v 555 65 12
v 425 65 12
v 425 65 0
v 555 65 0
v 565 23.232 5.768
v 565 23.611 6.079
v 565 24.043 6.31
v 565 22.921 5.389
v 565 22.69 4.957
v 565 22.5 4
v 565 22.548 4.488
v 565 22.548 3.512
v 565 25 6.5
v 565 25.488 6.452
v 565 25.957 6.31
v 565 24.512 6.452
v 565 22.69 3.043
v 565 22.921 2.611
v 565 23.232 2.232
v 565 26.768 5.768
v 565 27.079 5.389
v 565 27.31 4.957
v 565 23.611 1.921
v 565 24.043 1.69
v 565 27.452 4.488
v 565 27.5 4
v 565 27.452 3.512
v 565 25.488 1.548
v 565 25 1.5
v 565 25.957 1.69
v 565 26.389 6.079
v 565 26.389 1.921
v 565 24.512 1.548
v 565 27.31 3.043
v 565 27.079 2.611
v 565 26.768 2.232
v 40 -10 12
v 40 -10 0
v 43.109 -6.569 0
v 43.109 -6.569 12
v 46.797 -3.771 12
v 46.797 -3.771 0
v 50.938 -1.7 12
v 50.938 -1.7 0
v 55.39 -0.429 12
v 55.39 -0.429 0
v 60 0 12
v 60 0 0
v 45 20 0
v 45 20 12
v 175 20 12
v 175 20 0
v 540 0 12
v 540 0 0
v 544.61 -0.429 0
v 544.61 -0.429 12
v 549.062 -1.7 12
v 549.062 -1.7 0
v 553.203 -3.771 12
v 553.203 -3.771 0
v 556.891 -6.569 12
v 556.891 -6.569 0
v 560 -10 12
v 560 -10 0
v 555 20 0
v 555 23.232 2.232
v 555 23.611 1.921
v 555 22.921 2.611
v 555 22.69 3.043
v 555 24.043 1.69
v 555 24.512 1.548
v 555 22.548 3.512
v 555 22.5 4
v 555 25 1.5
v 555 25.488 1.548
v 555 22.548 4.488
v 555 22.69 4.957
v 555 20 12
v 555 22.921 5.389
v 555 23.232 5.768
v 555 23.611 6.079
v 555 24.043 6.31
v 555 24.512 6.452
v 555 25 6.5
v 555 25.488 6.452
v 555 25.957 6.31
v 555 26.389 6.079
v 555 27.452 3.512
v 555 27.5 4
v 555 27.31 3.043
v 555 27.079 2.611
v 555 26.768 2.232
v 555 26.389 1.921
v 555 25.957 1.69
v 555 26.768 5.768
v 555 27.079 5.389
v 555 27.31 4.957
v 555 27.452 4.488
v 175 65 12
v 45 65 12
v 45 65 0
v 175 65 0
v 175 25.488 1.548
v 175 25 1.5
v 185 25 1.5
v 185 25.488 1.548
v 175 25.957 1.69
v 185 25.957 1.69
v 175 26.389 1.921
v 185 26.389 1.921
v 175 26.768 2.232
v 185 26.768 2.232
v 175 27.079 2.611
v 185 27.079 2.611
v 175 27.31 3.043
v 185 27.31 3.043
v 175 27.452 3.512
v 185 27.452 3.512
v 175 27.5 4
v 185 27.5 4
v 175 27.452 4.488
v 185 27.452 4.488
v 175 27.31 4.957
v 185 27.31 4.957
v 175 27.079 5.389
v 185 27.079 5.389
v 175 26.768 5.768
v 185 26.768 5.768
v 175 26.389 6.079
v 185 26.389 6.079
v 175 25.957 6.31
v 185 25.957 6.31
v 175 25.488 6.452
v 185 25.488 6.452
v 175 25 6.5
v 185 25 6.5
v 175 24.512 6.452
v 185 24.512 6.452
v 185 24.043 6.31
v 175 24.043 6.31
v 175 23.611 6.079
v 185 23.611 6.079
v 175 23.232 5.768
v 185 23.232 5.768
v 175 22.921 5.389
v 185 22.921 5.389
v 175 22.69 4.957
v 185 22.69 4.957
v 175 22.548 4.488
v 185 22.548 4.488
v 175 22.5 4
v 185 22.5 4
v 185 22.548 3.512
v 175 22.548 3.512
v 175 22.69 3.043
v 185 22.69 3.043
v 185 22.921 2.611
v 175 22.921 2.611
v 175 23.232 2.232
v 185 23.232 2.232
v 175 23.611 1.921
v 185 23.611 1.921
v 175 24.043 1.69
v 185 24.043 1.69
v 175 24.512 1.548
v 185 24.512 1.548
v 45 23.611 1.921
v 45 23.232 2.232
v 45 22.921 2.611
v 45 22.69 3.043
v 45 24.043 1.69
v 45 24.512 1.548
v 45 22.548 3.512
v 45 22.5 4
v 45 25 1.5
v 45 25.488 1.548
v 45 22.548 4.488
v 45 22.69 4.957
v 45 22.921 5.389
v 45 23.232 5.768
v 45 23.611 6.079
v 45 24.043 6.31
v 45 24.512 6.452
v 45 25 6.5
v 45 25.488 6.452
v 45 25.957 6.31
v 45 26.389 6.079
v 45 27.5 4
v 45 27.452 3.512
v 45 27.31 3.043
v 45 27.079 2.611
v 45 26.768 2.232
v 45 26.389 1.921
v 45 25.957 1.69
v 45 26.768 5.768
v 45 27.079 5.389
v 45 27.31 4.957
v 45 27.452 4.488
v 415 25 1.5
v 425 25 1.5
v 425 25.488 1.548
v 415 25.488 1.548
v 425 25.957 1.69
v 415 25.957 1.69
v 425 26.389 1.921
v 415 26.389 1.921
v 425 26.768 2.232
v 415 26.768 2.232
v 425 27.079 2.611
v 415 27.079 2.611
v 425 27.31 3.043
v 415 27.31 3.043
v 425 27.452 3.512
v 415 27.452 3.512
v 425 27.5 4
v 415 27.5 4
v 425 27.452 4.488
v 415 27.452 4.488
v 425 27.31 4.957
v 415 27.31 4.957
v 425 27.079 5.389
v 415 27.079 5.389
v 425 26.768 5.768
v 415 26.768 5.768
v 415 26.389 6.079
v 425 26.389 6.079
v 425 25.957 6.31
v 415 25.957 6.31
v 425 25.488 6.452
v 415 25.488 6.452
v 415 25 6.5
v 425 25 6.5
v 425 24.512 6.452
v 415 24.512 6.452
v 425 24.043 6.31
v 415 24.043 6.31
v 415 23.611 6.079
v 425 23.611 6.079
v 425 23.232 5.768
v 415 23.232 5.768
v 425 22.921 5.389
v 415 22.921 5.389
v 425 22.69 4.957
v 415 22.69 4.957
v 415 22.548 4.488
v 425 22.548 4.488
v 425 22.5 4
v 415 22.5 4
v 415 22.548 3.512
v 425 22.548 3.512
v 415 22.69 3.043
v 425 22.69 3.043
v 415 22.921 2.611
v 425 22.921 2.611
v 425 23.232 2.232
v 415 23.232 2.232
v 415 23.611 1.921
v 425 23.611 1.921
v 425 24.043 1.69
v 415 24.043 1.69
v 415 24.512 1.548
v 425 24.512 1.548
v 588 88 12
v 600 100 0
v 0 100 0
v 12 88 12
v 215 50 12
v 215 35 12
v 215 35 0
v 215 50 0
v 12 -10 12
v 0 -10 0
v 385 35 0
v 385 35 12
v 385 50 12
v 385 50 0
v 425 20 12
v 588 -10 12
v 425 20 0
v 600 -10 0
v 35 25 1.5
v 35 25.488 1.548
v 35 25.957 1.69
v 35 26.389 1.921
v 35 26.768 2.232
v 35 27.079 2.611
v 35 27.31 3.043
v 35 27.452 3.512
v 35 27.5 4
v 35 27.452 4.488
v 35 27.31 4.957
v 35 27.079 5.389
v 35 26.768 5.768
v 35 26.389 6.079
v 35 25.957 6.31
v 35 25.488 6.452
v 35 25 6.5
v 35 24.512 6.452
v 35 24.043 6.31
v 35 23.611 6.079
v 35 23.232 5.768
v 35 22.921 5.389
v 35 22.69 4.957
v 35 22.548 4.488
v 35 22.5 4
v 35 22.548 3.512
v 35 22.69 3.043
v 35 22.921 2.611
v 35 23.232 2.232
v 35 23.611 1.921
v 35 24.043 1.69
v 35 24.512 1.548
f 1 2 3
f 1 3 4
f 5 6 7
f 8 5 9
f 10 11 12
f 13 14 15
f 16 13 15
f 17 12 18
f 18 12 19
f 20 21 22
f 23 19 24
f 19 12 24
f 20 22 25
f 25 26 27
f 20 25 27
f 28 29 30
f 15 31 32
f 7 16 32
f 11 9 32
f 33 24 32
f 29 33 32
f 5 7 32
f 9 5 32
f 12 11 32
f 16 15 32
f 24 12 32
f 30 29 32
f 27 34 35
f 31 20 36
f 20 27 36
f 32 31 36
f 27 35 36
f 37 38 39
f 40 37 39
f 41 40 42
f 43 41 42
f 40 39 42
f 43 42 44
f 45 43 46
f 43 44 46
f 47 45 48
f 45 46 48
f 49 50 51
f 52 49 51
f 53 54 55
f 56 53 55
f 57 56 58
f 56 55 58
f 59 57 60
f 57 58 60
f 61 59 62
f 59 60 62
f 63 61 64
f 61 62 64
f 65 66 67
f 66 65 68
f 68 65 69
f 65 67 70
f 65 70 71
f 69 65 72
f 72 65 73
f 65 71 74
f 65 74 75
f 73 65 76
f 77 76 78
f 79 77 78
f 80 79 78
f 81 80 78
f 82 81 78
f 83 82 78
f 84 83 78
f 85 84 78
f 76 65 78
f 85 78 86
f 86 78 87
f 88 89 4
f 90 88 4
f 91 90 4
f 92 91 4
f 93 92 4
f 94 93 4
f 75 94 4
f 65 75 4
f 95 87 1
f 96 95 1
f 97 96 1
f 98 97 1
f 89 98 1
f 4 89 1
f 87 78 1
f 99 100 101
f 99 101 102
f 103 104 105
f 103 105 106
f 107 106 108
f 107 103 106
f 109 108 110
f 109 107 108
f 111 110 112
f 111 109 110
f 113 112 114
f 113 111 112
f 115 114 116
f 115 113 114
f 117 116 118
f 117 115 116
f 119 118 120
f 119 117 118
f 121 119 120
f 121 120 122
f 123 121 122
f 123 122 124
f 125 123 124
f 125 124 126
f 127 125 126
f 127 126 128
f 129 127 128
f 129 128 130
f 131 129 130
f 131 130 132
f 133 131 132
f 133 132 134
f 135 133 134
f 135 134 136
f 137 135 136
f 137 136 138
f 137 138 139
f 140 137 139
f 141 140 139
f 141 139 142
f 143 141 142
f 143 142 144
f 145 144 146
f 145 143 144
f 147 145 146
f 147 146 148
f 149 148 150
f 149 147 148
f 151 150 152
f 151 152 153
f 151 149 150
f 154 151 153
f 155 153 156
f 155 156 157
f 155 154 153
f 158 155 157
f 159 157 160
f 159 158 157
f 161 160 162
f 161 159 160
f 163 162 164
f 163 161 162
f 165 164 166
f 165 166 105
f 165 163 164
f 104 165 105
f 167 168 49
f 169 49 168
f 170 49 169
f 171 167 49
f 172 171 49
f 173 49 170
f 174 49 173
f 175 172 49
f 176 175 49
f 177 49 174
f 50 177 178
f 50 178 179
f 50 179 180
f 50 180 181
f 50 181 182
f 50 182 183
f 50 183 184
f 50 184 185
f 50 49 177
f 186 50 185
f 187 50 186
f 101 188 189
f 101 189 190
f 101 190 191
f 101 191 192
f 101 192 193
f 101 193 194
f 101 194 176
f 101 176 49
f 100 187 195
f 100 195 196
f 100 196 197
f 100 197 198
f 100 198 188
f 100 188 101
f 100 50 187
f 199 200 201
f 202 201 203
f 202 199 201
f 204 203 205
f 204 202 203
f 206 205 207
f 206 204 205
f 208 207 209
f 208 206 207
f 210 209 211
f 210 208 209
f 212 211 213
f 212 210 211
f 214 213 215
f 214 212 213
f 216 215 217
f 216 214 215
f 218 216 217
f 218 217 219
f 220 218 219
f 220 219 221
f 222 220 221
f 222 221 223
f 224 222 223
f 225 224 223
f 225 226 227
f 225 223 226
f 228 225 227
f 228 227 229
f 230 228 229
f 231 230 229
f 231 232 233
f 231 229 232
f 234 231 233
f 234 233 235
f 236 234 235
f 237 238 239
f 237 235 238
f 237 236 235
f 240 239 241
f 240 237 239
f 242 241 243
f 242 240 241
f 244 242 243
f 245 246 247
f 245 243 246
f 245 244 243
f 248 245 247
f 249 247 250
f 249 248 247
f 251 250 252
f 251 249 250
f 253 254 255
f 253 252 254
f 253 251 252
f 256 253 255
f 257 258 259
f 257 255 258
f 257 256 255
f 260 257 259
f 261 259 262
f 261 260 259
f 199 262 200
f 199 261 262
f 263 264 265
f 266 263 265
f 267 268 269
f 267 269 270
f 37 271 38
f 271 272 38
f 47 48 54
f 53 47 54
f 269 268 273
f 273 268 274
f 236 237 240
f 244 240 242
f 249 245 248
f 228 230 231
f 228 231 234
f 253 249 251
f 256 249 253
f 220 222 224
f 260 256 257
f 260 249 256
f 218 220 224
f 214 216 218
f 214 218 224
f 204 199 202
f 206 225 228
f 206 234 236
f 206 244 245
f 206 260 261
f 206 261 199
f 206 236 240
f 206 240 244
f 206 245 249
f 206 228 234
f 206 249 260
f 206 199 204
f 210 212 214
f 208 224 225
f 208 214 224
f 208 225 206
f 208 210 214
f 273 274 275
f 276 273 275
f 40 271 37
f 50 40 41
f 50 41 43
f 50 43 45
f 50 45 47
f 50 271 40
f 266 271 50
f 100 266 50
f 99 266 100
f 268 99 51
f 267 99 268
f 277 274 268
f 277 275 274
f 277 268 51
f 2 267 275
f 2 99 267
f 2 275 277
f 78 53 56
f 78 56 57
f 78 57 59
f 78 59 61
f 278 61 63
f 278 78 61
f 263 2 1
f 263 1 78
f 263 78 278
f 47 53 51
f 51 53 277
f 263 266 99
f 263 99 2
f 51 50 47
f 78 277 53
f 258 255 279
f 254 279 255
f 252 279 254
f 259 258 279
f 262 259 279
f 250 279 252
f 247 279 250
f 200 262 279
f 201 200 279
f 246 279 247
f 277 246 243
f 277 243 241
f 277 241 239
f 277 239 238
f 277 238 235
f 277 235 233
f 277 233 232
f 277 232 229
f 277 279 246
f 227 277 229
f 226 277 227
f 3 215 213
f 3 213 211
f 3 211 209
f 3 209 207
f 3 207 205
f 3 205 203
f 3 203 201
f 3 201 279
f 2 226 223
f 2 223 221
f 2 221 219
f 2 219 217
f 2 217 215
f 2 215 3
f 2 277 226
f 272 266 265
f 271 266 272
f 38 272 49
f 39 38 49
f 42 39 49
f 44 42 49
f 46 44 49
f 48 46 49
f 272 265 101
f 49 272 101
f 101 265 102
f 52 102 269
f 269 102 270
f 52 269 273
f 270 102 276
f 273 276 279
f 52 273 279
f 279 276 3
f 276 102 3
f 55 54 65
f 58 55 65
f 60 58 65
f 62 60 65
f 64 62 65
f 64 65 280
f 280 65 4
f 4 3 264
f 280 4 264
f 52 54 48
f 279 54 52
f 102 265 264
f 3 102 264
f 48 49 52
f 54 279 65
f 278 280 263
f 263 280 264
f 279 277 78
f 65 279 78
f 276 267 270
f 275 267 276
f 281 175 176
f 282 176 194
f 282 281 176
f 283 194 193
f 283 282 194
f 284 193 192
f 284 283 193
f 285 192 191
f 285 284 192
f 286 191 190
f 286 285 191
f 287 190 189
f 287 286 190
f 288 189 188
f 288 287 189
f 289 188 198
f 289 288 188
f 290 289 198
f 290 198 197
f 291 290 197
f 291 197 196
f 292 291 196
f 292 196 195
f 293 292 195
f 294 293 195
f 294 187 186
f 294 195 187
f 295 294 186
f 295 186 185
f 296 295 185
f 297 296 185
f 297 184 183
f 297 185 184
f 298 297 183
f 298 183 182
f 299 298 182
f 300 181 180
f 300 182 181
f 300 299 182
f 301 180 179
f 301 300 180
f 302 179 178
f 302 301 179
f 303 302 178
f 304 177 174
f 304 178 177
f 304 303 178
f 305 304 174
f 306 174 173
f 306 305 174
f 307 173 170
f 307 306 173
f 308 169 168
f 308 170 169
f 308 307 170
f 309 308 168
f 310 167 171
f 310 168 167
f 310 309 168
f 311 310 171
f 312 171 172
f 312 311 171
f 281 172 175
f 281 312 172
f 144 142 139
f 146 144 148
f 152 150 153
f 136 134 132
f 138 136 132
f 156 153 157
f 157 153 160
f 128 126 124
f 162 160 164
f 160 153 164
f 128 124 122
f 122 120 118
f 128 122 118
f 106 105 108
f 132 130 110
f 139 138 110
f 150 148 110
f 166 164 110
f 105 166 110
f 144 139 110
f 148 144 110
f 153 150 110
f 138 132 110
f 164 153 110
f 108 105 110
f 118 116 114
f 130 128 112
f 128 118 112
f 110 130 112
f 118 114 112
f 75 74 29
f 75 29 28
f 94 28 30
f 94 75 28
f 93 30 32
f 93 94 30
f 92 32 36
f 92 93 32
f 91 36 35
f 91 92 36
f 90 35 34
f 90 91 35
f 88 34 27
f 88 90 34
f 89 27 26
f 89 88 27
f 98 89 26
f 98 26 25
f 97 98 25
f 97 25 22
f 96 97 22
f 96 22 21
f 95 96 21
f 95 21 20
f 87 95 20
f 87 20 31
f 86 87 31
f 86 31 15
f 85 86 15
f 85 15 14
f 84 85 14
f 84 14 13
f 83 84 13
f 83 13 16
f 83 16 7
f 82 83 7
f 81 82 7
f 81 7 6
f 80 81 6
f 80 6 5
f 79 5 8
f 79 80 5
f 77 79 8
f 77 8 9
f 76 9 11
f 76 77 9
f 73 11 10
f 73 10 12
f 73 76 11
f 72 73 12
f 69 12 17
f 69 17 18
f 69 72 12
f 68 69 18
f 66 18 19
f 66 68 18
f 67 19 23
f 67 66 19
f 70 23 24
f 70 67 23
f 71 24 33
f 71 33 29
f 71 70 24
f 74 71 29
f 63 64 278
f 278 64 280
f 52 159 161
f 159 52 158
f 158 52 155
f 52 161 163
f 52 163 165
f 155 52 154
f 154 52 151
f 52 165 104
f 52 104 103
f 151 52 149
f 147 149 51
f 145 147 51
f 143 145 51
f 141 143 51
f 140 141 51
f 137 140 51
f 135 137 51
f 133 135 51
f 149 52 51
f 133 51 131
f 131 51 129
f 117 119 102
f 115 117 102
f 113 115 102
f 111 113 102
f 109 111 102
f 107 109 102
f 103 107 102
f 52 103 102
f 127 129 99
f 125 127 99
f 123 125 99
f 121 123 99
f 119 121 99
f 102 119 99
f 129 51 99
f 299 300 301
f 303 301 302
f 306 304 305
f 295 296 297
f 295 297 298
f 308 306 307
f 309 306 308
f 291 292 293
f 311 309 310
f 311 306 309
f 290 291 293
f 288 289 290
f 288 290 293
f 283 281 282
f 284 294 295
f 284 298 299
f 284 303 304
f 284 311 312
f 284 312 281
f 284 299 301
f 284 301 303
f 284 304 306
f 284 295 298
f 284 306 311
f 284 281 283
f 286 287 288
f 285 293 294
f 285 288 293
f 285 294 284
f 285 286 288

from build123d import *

# Parameters (mm, degrees)
BOSS_EXTRUDE1_DEPTH = 12
SKETCH2_W           = 130
SKETCH2_H           = 45
SKETCH2_W_2         = 170
SKETCH2_H_2         = 15
CUT_EXTRUDE1_DEPTH  = 609.394608786
CHAMFER1_SIZE       = 12
CUT_EXTRUDE2_START  = -10
SKETCH3_R           = 2.5
CUT_EXTRUDE2_DEPTH  = 150
CUT_EXTRUDE3_START  = 370
SKETCH3_2_R         = 2.5
CUT_EXTRUDE3_DEPTH  = 150


with BuildPart() as part:
    # Sketch1 → Boss-Extrude1 (new body)
    with BuildSketch(Plane.XY):
        with BuildLine():
            Line((0, 0), (0, -10))
            Line((0, -10), (40, -10))
            ThreePointArc((40, -10), (48.819660113, -2.639320225), (60, 0))
            Line((60, 0), (540, 0))
            ThreePointArc((540, 0), (551.180339887, -2.639320225), (560, -10))
            Line((560, -10), (600, -10))
            Line((600, -10), (600, 0))
            Line((600, 0), (600, 100))
            Line((600, 100), (0, 100))
            Line((0, 100), (0, 0))
        make_face()
    extrude(amount=BOSS_EXTRUDE1_DEPTH)

    # Sketch2 → Cut-Extrude1 (cut, through all)
    with BuildSketch(Plane.XY.offset(12)):
        with Locations((110, 42.5)):
            Rectangle(SKETCH2_W, SKETCH2_H)
        with Locations((300, 42.5)):
            Rectangle(SKETCH2_W_2, SKETCH2_H_2)
        with Locations((490, 42.5)):
            Rectangle(SKETCH2_W, SKETCH2_H)
    extrude(amount=-CUT_EXTRUDE1_DEPTH, mode=Mode.SUBTRACT)

    # Chamfer1
    chamfer1_edges = [part.edges().sort_by_distance(p)[0] for p in [
        (600, 45, 12),
        (300, 100, 12),
        (0, 45, 12),
    ]]
    chamfer(chamfer1_edges, length=CHAMFER1_SIZE - 0.0001)  # a hair under: the kernel refuses the full size

    # Sketch3 → Cut-Extrude2 (cut)
    with BuildSketch(Plane(origin=(45, 0, 0), x_dir=(0, 0, -1), z_dir=(1, 0, 0)).offset(CUT_EXTRUDE2_START)):
        with Locations((-4, 25)):
            Circle(SKETCH3_R)
    extrude(amount=CUT_EXTRUDE2_DEPTH, mode=Mode.SUBTRACT)

    # Sketch3<2> → Cut-Extrude3 (cut)
    with BuildSketch(Plane(origin=(45, 0, 0), x_dir=(0, 0, -1), z_dir=(1, 0, 0)).offset(CUT_EXTRUDE3_START)):
        with Locations((-4, 25)):
            Circle(SKETCH3_2_R)
    extrude(amount=CUT_EXTRUDE3_DEPTH, mode=Mode.SUBTRACT)


solid = part.part
